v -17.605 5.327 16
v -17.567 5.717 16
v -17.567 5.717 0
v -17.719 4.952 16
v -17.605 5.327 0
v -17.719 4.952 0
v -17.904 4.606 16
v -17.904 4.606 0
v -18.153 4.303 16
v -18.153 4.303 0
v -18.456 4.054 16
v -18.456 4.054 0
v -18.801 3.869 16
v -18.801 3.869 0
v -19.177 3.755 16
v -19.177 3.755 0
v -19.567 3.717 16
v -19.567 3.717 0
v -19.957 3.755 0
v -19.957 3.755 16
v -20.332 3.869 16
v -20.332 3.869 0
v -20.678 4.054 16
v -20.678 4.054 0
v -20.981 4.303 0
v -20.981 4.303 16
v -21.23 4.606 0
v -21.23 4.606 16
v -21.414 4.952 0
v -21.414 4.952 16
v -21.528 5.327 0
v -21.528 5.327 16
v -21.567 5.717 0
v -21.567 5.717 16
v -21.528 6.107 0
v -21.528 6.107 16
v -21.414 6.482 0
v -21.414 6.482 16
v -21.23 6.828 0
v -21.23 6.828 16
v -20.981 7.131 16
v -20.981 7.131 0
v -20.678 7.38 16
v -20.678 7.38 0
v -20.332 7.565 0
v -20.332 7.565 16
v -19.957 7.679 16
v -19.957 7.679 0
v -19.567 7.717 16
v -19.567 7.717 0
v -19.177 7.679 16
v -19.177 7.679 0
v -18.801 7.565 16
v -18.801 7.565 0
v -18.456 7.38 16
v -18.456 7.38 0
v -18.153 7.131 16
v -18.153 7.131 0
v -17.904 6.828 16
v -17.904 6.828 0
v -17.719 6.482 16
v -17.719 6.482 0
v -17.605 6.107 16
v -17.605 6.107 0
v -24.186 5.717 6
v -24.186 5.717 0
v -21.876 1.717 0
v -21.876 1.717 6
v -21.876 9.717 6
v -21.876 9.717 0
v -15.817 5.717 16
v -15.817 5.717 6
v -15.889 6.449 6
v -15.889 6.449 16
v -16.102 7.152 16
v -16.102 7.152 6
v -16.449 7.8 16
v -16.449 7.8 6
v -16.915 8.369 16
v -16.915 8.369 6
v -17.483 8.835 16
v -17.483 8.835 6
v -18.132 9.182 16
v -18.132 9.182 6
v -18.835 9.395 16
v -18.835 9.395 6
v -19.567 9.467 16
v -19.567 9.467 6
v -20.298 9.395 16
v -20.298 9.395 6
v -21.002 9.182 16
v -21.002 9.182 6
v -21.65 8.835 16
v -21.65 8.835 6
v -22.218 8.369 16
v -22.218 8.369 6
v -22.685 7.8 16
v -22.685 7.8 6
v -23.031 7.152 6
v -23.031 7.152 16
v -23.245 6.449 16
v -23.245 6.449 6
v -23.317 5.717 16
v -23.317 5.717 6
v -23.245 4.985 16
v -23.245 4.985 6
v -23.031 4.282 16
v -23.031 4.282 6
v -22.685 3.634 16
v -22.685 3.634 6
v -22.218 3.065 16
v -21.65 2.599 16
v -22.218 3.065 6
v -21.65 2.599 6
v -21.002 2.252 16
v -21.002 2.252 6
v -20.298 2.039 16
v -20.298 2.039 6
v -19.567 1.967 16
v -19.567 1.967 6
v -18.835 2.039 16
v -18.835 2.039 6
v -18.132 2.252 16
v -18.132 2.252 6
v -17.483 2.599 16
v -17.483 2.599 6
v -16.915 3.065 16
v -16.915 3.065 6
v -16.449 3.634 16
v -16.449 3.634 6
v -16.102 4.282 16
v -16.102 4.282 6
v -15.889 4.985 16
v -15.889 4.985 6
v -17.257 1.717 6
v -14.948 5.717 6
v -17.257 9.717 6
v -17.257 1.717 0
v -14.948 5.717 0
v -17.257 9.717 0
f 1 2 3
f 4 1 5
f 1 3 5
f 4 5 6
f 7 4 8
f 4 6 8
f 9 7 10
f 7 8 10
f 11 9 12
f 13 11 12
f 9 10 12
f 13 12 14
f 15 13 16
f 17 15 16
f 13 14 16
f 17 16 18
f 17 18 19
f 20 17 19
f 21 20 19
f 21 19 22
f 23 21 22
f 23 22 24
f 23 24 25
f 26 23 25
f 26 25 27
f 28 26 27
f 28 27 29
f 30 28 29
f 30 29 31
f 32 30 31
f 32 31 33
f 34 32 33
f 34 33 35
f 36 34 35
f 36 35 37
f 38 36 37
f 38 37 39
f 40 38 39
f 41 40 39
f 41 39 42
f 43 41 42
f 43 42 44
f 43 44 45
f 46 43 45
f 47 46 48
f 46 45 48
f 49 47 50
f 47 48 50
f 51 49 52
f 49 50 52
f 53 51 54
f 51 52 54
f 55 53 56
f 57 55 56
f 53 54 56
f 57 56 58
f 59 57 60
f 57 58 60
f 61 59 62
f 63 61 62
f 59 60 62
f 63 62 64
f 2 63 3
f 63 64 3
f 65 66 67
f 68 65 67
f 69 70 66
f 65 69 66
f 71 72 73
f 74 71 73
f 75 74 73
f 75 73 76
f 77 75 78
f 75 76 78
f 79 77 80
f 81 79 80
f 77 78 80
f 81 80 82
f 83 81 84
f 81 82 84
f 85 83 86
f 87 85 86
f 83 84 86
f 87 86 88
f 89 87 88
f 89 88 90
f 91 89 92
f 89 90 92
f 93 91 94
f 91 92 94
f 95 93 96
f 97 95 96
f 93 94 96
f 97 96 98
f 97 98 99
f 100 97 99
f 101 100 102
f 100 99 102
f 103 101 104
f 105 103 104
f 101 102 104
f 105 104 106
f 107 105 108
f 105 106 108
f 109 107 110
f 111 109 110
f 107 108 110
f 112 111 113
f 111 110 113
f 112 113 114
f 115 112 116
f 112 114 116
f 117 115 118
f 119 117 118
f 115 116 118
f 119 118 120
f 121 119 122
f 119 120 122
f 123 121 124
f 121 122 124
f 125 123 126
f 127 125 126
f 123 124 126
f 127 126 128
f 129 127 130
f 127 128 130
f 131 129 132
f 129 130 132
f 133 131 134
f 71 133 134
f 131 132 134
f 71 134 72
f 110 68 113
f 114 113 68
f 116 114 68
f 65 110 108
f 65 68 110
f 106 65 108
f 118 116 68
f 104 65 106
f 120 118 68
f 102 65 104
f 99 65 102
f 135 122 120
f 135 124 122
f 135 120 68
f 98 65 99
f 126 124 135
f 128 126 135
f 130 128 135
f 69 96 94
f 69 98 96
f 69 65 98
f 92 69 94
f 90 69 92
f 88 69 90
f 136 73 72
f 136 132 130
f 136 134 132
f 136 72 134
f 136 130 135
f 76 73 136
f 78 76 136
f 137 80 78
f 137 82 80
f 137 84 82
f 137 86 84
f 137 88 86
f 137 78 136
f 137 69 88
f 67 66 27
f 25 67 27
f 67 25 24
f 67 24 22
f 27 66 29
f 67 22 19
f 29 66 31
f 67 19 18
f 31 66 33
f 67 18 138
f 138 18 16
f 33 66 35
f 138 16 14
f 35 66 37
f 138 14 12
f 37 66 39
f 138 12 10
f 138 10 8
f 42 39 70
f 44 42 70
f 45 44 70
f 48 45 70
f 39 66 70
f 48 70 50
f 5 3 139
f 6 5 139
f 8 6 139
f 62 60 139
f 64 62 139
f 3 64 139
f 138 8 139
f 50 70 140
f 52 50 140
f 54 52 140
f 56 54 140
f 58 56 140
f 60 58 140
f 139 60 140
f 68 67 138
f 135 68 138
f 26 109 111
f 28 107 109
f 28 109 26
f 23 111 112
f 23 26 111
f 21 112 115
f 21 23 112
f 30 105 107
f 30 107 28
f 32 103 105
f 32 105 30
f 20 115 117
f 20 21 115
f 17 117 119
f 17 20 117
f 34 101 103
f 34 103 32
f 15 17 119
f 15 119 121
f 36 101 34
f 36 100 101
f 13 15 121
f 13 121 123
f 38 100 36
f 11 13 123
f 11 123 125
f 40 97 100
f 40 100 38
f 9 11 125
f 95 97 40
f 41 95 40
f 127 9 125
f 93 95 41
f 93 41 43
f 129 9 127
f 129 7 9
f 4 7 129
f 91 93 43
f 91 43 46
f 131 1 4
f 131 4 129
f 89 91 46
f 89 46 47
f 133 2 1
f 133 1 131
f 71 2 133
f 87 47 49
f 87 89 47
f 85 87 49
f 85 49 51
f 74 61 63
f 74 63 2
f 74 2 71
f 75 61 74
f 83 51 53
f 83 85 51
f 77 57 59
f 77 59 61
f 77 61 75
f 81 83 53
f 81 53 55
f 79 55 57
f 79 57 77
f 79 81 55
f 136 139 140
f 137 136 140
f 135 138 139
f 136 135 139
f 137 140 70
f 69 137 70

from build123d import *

# Parameters (mm, degrees)
F1_DEPTH = 6
F2_R     = 3.75
F3_DEPTH = 10
F4_R     = 2
F5_DEPTH = 25


with BuildPart() as f1:
    # F0 (on Top) → F1 (new body)
    with BuildSketch(Plane.XY):
        Polygon((-17.257317, 9.717025), (-21.87612, 9.717025), (-24.185521, 5.717025), (-21.87612, 1.717025), (-17.257317, 1.717025), (-14.947916, 5.717025), align=None)
    extrude(amount=F1_DEPTH)

    # F2 (on face) → F3 (join)
    with BuildSketch(Plane.XY.offset(6)):
        with Locations((-19.566718, 5.717025)):
            Circle(F2_R)
    extrude(amount=F3_DEPTH)

    # F4 (on face) → F5 (cut)
    with BuildSketch(Plane(origin=(0, 0, 0), x_dir=(1, 0, 0), z_dir=(0, 0, -1))):
        with Locations((-19.566718, -5.717025)):
            Circle(F4_R)
    extrude(amount=-F5_DEPTH, mode=Mode.SUBTRACT)


solid = f1.part
